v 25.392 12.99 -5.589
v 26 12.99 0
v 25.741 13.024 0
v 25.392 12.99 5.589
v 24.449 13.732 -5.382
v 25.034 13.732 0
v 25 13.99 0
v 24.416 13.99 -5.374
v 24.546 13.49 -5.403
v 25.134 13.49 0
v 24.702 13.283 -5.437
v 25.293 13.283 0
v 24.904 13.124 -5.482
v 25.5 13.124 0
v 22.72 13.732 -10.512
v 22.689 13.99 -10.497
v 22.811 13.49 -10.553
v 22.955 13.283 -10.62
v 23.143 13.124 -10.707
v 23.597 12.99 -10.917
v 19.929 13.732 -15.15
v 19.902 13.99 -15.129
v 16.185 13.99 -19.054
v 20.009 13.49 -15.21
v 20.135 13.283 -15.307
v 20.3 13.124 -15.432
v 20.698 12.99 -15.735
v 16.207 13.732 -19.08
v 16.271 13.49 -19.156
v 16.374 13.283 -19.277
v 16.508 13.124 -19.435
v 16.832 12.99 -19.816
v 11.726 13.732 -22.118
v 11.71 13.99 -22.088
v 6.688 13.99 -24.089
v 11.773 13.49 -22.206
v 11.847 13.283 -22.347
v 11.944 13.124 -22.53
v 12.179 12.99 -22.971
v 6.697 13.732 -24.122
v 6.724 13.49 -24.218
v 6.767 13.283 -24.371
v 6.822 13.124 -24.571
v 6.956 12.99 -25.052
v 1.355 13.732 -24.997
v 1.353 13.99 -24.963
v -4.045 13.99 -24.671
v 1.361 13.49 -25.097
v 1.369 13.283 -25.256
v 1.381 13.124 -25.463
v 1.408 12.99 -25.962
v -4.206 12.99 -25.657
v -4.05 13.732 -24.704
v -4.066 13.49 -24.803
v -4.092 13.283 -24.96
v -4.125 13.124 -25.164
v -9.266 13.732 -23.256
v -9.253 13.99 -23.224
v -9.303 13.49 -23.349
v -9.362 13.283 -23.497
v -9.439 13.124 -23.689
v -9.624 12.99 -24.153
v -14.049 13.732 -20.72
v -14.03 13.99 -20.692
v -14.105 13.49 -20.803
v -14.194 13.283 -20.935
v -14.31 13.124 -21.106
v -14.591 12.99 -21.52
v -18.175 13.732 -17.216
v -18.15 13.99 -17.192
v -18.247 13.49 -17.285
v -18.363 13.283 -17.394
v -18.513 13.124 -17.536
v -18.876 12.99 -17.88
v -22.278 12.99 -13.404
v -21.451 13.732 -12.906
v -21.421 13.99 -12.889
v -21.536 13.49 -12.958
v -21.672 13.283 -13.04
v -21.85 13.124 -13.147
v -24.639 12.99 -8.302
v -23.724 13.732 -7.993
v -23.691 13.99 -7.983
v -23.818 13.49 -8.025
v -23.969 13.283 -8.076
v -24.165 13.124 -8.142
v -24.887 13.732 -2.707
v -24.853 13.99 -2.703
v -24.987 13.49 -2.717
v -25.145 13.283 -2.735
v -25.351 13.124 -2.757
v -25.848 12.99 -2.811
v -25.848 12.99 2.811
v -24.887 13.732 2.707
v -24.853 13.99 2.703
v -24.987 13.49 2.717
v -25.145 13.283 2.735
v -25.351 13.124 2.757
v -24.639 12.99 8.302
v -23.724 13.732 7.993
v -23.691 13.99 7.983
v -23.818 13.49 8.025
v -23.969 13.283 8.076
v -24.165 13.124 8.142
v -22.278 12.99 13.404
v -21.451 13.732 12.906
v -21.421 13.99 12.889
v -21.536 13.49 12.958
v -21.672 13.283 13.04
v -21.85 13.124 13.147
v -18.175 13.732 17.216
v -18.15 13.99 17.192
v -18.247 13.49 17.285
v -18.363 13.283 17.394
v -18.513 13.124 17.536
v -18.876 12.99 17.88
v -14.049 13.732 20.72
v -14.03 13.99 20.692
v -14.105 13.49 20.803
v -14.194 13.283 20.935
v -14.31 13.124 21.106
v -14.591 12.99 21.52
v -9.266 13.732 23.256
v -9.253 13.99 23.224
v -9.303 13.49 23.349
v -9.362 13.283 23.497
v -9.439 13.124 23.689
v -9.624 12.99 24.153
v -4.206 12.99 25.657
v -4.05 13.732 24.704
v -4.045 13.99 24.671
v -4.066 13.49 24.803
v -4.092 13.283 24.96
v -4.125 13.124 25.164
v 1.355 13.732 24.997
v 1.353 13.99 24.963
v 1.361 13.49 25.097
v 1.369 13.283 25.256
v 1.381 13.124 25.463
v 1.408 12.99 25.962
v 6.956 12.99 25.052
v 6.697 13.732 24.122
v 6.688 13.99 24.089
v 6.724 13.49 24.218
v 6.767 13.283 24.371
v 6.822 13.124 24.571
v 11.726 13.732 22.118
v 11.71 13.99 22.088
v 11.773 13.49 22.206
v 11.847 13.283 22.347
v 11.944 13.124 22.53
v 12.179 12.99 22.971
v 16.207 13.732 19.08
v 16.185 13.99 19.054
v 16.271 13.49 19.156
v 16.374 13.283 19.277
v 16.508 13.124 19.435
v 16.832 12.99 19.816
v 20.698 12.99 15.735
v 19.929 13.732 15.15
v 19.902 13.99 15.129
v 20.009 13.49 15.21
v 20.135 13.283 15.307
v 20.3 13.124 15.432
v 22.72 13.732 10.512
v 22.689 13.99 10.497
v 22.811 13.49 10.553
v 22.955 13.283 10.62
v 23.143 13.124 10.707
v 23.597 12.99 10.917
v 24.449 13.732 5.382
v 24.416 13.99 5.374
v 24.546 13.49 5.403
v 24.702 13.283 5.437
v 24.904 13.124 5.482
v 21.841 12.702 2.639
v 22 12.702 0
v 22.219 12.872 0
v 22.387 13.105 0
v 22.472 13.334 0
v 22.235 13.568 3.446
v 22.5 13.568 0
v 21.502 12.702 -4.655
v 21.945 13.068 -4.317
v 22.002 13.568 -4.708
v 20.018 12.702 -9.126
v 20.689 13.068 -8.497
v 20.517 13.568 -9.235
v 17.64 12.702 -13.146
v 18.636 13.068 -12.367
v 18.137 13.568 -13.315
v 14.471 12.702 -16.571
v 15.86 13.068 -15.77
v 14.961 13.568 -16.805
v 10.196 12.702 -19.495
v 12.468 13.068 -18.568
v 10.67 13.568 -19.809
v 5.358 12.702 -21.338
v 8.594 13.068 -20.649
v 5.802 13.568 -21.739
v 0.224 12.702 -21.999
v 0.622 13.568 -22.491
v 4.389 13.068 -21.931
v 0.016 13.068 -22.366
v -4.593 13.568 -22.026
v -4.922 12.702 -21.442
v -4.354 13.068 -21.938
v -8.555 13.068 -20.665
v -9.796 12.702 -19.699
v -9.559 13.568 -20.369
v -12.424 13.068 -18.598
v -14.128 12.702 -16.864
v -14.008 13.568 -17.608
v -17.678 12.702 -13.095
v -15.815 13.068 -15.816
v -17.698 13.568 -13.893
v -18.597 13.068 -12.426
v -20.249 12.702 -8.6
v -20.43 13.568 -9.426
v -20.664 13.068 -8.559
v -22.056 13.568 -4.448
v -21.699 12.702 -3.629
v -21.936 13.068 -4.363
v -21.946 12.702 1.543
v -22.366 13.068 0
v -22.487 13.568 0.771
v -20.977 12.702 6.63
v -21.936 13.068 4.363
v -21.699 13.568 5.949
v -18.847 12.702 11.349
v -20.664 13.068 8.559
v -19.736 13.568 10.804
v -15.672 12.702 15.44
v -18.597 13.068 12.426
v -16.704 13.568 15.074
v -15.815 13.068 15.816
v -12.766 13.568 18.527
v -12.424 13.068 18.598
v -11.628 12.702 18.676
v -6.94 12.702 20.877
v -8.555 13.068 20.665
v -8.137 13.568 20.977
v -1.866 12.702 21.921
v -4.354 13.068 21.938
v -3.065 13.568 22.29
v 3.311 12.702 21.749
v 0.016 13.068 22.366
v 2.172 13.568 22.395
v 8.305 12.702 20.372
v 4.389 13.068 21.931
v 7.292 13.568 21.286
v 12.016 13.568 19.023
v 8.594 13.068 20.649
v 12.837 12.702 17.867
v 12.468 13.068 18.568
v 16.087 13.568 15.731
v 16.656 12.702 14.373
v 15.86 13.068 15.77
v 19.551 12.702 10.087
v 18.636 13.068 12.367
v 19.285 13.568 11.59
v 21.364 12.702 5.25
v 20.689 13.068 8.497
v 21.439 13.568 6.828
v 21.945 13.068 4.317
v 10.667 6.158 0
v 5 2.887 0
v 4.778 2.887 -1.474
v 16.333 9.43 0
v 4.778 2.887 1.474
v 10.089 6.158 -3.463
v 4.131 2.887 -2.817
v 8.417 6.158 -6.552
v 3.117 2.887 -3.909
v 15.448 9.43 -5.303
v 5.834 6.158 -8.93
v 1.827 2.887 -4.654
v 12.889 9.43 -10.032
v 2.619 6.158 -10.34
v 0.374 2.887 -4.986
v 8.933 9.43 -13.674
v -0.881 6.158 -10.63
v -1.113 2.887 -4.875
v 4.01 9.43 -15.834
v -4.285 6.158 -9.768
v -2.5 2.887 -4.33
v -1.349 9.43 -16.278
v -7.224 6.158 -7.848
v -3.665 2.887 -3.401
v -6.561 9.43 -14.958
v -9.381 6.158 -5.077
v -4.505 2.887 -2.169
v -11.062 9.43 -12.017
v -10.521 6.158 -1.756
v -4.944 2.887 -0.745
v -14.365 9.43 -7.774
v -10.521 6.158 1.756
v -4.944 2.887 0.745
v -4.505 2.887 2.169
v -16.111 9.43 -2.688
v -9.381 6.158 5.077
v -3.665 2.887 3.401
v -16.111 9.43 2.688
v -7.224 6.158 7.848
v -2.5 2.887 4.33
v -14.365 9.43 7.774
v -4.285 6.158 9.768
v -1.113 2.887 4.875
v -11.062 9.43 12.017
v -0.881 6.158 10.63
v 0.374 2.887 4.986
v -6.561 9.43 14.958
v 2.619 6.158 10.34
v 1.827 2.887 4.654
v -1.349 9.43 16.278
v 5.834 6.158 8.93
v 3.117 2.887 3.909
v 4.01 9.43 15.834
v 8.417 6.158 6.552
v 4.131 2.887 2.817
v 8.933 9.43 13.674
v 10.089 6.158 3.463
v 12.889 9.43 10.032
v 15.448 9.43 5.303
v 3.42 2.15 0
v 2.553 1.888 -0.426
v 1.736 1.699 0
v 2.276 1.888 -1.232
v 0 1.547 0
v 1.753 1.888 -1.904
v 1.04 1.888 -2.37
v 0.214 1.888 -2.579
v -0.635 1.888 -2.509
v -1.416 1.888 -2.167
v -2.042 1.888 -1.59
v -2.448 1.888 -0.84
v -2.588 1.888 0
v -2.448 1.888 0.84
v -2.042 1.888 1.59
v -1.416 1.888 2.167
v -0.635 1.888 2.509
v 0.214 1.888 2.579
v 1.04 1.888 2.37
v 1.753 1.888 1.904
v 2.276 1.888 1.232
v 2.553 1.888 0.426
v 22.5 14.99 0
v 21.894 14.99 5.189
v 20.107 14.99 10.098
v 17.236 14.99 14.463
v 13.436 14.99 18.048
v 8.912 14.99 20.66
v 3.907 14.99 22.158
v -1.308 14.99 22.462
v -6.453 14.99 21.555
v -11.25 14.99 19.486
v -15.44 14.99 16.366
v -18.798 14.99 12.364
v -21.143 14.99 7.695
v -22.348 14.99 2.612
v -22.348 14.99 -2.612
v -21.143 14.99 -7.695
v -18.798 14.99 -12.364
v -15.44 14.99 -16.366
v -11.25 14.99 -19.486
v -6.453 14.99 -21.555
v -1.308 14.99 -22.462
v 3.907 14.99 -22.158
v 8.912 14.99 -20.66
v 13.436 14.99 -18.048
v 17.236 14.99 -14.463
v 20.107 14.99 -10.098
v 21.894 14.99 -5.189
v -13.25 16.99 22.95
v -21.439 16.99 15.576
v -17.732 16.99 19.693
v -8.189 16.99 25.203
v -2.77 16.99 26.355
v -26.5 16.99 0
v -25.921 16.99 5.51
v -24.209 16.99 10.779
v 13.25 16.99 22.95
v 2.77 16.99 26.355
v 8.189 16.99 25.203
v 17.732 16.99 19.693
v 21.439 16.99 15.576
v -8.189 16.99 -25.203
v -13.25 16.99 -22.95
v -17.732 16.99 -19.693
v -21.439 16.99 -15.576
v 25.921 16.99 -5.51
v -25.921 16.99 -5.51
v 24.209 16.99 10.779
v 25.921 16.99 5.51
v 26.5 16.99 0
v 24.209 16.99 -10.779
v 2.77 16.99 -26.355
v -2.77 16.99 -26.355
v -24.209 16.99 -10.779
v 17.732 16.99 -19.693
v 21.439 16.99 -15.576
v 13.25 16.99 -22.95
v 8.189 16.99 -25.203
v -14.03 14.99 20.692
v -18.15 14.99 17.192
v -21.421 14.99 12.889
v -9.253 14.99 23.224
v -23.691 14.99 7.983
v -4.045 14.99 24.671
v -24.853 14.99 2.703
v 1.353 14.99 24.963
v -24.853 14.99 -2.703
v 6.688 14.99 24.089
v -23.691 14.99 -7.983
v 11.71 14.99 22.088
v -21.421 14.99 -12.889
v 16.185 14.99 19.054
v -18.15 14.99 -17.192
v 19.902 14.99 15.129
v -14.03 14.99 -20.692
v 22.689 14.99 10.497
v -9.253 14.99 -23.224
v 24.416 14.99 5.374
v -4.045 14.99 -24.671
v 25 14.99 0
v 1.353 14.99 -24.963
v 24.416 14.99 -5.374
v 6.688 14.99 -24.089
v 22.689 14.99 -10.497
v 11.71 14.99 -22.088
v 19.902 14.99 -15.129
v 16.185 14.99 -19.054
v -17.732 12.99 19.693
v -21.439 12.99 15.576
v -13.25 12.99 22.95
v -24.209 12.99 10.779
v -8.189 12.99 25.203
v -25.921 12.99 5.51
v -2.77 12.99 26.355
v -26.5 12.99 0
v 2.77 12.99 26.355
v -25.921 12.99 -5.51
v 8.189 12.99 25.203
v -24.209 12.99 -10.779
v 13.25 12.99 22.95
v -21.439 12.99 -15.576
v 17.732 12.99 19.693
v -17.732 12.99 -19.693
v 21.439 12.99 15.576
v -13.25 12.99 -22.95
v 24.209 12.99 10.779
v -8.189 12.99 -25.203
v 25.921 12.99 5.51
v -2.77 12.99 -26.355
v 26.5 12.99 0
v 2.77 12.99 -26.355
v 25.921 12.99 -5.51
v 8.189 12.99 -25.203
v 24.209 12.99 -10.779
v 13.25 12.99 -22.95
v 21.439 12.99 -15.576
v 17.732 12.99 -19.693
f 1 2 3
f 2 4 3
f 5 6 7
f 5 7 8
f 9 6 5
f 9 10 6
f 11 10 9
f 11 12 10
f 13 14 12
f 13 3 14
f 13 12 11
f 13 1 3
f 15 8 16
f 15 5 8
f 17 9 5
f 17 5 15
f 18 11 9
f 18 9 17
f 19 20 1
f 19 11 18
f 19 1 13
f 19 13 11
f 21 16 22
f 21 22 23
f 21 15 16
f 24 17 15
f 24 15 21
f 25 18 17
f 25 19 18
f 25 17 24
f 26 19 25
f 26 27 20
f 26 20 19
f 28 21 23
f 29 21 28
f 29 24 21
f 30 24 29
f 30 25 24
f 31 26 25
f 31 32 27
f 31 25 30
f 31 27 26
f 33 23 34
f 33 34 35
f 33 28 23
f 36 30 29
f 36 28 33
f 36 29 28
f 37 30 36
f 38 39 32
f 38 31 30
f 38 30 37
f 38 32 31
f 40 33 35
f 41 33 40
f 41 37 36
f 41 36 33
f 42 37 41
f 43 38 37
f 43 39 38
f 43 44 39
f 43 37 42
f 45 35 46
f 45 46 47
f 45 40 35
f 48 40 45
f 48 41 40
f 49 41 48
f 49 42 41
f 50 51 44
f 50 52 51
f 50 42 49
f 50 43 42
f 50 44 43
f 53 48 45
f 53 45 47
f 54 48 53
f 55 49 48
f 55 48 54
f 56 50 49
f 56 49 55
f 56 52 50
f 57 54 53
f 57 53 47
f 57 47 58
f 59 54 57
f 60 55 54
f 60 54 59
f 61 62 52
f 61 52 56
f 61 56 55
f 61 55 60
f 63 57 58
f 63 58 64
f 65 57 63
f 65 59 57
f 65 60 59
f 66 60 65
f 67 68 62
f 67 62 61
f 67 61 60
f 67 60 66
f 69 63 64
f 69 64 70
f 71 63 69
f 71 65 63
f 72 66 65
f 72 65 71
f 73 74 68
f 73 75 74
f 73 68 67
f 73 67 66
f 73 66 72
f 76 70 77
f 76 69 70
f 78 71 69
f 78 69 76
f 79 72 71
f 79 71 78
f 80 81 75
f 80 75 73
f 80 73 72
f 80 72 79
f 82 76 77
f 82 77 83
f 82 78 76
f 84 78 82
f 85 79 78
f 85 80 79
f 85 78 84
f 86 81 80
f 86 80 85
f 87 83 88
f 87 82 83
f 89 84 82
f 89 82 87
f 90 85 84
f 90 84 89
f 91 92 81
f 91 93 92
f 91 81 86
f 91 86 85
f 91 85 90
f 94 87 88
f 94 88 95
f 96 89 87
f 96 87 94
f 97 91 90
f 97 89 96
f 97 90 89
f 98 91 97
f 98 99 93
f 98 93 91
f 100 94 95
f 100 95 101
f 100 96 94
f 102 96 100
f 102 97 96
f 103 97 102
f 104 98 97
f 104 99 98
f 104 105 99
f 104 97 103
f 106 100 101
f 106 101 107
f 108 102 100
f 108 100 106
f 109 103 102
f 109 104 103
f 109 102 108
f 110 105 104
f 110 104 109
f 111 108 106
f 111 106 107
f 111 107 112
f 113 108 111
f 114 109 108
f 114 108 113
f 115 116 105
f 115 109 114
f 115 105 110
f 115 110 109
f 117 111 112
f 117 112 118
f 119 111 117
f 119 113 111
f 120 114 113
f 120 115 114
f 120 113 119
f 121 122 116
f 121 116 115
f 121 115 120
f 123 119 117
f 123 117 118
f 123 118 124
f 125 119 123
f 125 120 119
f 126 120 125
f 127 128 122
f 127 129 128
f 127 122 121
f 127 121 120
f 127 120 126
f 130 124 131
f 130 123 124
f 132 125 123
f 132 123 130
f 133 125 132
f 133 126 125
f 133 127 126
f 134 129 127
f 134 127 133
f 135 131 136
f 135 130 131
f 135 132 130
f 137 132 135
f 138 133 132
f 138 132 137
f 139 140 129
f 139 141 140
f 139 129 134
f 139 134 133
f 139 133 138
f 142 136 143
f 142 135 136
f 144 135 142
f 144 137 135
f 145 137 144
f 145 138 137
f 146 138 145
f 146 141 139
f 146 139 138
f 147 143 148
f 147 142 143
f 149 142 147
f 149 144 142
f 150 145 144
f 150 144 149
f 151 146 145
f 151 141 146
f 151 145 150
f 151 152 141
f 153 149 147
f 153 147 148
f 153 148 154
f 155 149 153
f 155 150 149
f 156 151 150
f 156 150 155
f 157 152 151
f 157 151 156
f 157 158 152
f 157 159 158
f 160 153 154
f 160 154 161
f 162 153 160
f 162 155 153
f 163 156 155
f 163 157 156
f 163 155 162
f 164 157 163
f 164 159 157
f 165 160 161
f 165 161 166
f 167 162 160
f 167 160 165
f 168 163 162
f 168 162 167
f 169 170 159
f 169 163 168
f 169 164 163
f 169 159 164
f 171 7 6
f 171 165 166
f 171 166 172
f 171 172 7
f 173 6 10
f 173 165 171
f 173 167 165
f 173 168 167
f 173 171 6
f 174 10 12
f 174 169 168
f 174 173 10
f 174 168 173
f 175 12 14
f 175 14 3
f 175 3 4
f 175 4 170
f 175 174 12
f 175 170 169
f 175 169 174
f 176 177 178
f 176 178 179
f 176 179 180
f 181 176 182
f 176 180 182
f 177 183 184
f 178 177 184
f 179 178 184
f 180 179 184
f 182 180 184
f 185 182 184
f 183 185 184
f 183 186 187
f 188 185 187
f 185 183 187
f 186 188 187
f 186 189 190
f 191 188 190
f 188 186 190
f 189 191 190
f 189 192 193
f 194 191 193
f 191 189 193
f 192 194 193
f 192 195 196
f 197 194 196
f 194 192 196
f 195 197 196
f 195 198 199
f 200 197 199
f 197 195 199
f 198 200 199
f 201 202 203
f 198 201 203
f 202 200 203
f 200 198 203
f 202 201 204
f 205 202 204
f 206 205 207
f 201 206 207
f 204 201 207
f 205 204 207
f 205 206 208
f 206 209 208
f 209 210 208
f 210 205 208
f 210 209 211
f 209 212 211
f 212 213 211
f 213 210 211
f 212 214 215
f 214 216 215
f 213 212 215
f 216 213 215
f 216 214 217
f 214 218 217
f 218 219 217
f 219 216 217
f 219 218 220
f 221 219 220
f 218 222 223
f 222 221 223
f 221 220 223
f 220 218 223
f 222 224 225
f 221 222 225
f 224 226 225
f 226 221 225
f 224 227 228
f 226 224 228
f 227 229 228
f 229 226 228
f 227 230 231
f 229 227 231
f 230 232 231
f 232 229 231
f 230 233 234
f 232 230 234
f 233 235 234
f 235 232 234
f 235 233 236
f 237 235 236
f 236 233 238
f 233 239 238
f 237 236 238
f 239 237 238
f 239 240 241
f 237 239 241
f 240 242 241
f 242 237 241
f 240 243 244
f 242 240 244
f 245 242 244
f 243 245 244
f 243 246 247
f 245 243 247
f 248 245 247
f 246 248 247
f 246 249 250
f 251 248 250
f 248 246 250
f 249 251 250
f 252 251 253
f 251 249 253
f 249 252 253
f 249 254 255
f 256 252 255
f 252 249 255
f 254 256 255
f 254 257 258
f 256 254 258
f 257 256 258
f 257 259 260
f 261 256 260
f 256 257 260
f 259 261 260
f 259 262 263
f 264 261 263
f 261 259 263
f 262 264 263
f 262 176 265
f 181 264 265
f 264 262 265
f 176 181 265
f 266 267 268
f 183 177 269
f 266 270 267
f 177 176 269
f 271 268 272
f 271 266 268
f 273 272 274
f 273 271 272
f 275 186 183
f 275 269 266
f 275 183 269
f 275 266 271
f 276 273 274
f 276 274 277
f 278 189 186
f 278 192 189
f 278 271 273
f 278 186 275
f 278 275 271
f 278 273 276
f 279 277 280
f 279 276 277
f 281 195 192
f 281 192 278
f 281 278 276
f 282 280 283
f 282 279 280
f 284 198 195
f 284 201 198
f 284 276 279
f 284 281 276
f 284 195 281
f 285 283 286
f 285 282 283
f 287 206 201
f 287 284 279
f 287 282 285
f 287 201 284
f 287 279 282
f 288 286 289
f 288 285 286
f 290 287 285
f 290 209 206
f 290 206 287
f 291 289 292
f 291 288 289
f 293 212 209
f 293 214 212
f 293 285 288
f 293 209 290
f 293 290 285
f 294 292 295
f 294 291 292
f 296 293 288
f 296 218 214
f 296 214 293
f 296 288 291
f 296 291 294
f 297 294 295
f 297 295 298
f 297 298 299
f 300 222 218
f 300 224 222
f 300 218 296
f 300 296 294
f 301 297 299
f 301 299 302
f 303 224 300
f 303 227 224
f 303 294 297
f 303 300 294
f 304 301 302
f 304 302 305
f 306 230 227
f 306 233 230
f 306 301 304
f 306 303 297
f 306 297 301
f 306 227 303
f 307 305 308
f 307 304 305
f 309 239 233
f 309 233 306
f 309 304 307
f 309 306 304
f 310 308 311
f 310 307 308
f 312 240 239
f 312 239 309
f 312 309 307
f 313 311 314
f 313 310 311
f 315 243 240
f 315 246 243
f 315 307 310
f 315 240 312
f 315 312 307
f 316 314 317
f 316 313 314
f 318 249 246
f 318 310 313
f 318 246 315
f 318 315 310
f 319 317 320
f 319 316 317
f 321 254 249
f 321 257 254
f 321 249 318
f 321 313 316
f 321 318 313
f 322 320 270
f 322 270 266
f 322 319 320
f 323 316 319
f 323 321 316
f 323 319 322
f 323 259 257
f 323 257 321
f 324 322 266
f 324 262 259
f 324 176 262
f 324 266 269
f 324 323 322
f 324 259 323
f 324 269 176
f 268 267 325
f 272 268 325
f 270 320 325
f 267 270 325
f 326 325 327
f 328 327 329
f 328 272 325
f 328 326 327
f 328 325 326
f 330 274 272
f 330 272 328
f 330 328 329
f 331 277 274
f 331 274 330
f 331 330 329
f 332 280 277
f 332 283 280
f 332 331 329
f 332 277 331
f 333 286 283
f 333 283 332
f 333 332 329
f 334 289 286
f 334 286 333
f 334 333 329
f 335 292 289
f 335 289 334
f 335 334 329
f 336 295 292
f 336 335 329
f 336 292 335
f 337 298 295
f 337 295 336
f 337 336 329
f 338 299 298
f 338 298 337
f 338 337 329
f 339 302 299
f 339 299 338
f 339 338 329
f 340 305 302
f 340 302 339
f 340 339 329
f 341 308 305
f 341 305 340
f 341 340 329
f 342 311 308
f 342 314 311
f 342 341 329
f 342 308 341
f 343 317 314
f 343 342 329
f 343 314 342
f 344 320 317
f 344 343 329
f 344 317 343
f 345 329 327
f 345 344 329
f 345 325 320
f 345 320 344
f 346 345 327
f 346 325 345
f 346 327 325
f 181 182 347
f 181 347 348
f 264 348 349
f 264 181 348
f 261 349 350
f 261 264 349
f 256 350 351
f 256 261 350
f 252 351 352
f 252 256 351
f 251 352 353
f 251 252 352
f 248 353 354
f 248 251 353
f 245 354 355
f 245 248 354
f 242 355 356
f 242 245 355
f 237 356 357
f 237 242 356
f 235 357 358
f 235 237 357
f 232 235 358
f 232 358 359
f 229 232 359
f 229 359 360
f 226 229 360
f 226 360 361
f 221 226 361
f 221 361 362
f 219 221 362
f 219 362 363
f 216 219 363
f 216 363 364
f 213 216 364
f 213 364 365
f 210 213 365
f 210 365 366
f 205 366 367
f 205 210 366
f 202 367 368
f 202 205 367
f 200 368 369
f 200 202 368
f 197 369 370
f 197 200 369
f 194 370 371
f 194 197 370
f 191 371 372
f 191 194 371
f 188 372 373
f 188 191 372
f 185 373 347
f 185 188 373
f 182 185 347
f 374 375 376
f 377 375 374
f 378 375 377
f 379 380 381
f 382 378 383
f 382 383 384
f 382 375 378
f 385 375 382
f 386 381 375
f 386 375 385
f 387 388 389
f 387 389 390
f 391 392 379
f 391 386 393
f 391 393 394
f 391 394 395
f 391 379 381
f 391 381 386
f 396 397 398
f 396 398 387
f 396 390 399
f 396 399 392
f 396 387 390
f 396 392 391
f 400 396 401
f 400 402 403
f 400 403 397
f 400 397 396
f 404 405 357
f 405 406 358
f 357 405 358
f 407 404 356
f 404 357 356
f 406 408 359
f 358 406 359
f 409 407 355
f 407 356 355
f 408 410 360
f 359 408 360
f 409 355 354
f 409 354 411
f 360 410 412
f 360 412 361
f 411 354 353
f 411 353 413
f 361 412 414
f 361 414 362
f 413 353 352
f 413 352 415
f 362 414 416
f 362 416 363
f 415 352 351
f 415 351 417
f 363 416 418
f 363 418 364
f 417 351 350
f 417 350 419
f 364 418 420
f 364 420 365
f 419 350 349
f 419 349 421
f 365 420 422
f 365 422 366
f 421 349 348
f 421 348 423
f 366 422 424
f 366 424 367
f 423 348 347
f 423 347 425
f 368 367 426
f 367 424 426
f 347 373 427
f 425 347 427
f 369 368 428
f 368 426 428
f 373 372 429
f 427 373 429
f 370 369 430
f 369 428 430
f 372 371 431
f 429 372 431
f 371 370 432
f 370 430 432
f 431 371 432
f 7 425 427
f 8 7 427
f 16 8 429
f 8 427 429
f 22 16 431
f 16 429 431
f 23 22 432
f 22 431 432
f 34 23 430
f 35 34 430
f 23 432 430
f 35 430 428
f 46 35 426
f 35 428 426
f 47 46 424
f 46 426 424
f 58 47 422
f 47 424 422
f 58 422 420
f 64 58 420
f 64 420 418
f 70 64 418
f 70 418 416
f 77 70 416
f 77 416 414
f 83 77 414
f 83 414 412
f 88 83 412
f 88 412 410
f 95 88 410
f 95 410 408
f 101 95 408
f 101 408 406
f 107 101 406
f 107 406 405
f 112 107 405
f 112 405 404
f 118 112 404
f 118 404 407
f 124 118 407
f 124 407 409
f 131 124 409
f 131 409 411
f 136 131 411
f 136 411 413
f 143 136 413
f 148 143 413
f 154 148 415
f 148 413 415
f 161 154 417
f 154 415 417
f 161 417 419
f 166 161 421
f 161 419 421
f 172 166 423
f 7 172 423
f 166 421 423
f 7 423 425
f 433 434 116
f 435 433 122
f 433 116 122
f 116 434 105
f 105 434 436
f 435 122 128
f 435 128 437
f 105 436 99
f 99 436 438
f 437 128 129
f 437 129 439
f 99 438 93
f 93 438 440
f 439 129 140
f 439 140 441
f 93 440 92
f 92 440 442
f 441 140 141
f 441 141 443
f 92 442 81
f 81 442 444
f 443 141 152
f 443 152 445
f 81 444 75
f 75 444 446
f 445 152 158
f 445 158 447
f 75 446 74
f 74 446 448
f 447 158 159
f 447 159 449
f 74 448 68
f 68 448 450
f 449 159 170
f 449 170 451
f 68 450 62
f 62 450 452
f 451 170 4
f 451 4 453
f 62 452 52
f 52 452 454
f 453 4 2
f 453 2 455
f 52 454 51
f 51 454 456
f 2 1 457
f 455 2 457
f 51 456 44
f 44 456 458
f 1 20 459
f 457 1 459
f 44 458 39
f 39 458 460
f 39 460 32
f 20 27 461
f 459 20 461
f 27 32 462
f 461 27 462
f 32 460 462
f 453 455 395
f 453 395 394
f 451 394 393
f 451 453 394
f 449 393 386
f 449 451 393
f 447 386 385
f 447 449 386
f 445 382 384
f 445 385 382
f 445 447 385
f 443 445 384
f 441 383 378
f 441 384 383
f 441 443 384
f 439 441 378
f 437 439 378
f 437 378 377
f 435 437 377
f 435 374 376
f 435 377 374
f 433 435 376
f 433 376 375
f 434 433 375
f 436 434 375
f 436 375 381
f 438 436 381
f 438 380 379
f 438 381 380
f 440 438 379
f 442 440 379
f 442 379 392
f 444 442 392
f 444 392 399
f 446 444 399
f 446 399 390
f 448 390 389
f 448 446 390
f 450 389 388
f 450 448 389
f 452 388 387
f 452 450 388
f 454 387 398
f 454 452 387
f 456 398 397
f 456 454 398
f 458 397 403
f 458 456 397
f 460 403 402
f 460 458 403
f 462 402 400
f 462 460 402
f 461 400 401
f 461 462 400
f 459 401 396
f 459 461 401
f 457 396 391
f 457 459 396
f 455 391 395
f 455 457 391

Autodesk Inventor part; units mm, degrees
ref_plane "YZ Plane" through (0, 0, 0) normal (1, 0, 0) x (0, 1, 0)
ref_plane "XZ Plane" through (0, 0, 0) normal (0, 1, 0) x (-1, 0, 0)
ref_plane "XY Plane" through (0, 0, 0) normal (0, 0, 1) x (1, 0, 0)
sketch "スケッチ1" plane through (0, 0, 0) normal (0, 0, 1) x (1, 0, 0)
  line L0 (5, 2.8868) -> (22.5, 12.9904)
  line L1 (22.5, 12.9904) -> (-22.5, 12.9904)
  line L2 (-22.5, 12.9904) -> (-5, 2.8868)
  line L3 (-22.5, 12.9904) -> (-22.5, 14.9904)
  line L4 (-22.5, 14.9904) -> (-25, 14.9904)
  line L5 (-25, 14.9904) -> (-25, 12.9904)
  line L6 (-25, 12.9904) -> (-26.5, 12.9904)
  line L7 (-26.5, 12.9904) -> (-26.5, 16.9904)
  line L8 (-26.5, 16.9904) -> (26.5, 16.9904)
  line L9 (26.5, 16.9904) -> (26.5, 12.9904)
  line L10 (26.5, 12.9904) -> (25, 12.9904)
  line L11 (25, 12.9904) -> (25, 14.9904)
  line L12 (25, 14.9904) -> (22.5, 14.9904)
  line L13 (22.5, 14.9904) -> (22.5, 12.9904)
  line L14 (-22.5, 14.9904) -> (-22.5, 54.9904)
  line L15 (-22.5, 54.9904) -> (22.5, 54.9904)
  line L16 (22.5, 54.9904) -> (22.5, 14.9904)
  arc A0 (-5, 2.8868) -> (5, 2.8868) centre (0, 11.547) ccw
  line L17 (0, 0) -> (0, 54.9904)
  line L18 (-25, 12.9904) -> (-25, 4.9904)
  line L19 (-25, 4.9904) -> (-26.5, 4.9904)
  line L20 (-26.5, 4.9904) -> (-26.5, 12.9904)
  line L21 (25, 12.9904) -> (25, 4.9904)
  line L22 (25, 4.9904) -> (26.5, 4.9904)
  line L23 (26.5, 4.9904) -> (26.5, 12.9904)
  point P0 (0, 1.547)
  point P1 (0, 16.9904)
  dimension "d0" = 45
  dimension "d1" = 30
  dimension "d2" = 2.5
  dimension "d3" = 1.5
  dimension "d4" = 2
  dimension "d5" = 4
  dimension "d6" = 40
  dimension "d7" = 10
  dimension "d9" = 8
  dimension "d10" = 50
revolve "回転1" add sketch "スケッチ1" angle 360 about axis through (0, 0, 0) along (0, 1, 0) contours A0 L17 L1 L0 | L1 L17 L8 L16 L13 | L16 L8 L9 L10 L11 L12
fillet "フィレット1" radius 1 2 edges at (-25, 12.9904, 0) (-22.5, 12.9904, 0)
properties part number "COne_mirror"
